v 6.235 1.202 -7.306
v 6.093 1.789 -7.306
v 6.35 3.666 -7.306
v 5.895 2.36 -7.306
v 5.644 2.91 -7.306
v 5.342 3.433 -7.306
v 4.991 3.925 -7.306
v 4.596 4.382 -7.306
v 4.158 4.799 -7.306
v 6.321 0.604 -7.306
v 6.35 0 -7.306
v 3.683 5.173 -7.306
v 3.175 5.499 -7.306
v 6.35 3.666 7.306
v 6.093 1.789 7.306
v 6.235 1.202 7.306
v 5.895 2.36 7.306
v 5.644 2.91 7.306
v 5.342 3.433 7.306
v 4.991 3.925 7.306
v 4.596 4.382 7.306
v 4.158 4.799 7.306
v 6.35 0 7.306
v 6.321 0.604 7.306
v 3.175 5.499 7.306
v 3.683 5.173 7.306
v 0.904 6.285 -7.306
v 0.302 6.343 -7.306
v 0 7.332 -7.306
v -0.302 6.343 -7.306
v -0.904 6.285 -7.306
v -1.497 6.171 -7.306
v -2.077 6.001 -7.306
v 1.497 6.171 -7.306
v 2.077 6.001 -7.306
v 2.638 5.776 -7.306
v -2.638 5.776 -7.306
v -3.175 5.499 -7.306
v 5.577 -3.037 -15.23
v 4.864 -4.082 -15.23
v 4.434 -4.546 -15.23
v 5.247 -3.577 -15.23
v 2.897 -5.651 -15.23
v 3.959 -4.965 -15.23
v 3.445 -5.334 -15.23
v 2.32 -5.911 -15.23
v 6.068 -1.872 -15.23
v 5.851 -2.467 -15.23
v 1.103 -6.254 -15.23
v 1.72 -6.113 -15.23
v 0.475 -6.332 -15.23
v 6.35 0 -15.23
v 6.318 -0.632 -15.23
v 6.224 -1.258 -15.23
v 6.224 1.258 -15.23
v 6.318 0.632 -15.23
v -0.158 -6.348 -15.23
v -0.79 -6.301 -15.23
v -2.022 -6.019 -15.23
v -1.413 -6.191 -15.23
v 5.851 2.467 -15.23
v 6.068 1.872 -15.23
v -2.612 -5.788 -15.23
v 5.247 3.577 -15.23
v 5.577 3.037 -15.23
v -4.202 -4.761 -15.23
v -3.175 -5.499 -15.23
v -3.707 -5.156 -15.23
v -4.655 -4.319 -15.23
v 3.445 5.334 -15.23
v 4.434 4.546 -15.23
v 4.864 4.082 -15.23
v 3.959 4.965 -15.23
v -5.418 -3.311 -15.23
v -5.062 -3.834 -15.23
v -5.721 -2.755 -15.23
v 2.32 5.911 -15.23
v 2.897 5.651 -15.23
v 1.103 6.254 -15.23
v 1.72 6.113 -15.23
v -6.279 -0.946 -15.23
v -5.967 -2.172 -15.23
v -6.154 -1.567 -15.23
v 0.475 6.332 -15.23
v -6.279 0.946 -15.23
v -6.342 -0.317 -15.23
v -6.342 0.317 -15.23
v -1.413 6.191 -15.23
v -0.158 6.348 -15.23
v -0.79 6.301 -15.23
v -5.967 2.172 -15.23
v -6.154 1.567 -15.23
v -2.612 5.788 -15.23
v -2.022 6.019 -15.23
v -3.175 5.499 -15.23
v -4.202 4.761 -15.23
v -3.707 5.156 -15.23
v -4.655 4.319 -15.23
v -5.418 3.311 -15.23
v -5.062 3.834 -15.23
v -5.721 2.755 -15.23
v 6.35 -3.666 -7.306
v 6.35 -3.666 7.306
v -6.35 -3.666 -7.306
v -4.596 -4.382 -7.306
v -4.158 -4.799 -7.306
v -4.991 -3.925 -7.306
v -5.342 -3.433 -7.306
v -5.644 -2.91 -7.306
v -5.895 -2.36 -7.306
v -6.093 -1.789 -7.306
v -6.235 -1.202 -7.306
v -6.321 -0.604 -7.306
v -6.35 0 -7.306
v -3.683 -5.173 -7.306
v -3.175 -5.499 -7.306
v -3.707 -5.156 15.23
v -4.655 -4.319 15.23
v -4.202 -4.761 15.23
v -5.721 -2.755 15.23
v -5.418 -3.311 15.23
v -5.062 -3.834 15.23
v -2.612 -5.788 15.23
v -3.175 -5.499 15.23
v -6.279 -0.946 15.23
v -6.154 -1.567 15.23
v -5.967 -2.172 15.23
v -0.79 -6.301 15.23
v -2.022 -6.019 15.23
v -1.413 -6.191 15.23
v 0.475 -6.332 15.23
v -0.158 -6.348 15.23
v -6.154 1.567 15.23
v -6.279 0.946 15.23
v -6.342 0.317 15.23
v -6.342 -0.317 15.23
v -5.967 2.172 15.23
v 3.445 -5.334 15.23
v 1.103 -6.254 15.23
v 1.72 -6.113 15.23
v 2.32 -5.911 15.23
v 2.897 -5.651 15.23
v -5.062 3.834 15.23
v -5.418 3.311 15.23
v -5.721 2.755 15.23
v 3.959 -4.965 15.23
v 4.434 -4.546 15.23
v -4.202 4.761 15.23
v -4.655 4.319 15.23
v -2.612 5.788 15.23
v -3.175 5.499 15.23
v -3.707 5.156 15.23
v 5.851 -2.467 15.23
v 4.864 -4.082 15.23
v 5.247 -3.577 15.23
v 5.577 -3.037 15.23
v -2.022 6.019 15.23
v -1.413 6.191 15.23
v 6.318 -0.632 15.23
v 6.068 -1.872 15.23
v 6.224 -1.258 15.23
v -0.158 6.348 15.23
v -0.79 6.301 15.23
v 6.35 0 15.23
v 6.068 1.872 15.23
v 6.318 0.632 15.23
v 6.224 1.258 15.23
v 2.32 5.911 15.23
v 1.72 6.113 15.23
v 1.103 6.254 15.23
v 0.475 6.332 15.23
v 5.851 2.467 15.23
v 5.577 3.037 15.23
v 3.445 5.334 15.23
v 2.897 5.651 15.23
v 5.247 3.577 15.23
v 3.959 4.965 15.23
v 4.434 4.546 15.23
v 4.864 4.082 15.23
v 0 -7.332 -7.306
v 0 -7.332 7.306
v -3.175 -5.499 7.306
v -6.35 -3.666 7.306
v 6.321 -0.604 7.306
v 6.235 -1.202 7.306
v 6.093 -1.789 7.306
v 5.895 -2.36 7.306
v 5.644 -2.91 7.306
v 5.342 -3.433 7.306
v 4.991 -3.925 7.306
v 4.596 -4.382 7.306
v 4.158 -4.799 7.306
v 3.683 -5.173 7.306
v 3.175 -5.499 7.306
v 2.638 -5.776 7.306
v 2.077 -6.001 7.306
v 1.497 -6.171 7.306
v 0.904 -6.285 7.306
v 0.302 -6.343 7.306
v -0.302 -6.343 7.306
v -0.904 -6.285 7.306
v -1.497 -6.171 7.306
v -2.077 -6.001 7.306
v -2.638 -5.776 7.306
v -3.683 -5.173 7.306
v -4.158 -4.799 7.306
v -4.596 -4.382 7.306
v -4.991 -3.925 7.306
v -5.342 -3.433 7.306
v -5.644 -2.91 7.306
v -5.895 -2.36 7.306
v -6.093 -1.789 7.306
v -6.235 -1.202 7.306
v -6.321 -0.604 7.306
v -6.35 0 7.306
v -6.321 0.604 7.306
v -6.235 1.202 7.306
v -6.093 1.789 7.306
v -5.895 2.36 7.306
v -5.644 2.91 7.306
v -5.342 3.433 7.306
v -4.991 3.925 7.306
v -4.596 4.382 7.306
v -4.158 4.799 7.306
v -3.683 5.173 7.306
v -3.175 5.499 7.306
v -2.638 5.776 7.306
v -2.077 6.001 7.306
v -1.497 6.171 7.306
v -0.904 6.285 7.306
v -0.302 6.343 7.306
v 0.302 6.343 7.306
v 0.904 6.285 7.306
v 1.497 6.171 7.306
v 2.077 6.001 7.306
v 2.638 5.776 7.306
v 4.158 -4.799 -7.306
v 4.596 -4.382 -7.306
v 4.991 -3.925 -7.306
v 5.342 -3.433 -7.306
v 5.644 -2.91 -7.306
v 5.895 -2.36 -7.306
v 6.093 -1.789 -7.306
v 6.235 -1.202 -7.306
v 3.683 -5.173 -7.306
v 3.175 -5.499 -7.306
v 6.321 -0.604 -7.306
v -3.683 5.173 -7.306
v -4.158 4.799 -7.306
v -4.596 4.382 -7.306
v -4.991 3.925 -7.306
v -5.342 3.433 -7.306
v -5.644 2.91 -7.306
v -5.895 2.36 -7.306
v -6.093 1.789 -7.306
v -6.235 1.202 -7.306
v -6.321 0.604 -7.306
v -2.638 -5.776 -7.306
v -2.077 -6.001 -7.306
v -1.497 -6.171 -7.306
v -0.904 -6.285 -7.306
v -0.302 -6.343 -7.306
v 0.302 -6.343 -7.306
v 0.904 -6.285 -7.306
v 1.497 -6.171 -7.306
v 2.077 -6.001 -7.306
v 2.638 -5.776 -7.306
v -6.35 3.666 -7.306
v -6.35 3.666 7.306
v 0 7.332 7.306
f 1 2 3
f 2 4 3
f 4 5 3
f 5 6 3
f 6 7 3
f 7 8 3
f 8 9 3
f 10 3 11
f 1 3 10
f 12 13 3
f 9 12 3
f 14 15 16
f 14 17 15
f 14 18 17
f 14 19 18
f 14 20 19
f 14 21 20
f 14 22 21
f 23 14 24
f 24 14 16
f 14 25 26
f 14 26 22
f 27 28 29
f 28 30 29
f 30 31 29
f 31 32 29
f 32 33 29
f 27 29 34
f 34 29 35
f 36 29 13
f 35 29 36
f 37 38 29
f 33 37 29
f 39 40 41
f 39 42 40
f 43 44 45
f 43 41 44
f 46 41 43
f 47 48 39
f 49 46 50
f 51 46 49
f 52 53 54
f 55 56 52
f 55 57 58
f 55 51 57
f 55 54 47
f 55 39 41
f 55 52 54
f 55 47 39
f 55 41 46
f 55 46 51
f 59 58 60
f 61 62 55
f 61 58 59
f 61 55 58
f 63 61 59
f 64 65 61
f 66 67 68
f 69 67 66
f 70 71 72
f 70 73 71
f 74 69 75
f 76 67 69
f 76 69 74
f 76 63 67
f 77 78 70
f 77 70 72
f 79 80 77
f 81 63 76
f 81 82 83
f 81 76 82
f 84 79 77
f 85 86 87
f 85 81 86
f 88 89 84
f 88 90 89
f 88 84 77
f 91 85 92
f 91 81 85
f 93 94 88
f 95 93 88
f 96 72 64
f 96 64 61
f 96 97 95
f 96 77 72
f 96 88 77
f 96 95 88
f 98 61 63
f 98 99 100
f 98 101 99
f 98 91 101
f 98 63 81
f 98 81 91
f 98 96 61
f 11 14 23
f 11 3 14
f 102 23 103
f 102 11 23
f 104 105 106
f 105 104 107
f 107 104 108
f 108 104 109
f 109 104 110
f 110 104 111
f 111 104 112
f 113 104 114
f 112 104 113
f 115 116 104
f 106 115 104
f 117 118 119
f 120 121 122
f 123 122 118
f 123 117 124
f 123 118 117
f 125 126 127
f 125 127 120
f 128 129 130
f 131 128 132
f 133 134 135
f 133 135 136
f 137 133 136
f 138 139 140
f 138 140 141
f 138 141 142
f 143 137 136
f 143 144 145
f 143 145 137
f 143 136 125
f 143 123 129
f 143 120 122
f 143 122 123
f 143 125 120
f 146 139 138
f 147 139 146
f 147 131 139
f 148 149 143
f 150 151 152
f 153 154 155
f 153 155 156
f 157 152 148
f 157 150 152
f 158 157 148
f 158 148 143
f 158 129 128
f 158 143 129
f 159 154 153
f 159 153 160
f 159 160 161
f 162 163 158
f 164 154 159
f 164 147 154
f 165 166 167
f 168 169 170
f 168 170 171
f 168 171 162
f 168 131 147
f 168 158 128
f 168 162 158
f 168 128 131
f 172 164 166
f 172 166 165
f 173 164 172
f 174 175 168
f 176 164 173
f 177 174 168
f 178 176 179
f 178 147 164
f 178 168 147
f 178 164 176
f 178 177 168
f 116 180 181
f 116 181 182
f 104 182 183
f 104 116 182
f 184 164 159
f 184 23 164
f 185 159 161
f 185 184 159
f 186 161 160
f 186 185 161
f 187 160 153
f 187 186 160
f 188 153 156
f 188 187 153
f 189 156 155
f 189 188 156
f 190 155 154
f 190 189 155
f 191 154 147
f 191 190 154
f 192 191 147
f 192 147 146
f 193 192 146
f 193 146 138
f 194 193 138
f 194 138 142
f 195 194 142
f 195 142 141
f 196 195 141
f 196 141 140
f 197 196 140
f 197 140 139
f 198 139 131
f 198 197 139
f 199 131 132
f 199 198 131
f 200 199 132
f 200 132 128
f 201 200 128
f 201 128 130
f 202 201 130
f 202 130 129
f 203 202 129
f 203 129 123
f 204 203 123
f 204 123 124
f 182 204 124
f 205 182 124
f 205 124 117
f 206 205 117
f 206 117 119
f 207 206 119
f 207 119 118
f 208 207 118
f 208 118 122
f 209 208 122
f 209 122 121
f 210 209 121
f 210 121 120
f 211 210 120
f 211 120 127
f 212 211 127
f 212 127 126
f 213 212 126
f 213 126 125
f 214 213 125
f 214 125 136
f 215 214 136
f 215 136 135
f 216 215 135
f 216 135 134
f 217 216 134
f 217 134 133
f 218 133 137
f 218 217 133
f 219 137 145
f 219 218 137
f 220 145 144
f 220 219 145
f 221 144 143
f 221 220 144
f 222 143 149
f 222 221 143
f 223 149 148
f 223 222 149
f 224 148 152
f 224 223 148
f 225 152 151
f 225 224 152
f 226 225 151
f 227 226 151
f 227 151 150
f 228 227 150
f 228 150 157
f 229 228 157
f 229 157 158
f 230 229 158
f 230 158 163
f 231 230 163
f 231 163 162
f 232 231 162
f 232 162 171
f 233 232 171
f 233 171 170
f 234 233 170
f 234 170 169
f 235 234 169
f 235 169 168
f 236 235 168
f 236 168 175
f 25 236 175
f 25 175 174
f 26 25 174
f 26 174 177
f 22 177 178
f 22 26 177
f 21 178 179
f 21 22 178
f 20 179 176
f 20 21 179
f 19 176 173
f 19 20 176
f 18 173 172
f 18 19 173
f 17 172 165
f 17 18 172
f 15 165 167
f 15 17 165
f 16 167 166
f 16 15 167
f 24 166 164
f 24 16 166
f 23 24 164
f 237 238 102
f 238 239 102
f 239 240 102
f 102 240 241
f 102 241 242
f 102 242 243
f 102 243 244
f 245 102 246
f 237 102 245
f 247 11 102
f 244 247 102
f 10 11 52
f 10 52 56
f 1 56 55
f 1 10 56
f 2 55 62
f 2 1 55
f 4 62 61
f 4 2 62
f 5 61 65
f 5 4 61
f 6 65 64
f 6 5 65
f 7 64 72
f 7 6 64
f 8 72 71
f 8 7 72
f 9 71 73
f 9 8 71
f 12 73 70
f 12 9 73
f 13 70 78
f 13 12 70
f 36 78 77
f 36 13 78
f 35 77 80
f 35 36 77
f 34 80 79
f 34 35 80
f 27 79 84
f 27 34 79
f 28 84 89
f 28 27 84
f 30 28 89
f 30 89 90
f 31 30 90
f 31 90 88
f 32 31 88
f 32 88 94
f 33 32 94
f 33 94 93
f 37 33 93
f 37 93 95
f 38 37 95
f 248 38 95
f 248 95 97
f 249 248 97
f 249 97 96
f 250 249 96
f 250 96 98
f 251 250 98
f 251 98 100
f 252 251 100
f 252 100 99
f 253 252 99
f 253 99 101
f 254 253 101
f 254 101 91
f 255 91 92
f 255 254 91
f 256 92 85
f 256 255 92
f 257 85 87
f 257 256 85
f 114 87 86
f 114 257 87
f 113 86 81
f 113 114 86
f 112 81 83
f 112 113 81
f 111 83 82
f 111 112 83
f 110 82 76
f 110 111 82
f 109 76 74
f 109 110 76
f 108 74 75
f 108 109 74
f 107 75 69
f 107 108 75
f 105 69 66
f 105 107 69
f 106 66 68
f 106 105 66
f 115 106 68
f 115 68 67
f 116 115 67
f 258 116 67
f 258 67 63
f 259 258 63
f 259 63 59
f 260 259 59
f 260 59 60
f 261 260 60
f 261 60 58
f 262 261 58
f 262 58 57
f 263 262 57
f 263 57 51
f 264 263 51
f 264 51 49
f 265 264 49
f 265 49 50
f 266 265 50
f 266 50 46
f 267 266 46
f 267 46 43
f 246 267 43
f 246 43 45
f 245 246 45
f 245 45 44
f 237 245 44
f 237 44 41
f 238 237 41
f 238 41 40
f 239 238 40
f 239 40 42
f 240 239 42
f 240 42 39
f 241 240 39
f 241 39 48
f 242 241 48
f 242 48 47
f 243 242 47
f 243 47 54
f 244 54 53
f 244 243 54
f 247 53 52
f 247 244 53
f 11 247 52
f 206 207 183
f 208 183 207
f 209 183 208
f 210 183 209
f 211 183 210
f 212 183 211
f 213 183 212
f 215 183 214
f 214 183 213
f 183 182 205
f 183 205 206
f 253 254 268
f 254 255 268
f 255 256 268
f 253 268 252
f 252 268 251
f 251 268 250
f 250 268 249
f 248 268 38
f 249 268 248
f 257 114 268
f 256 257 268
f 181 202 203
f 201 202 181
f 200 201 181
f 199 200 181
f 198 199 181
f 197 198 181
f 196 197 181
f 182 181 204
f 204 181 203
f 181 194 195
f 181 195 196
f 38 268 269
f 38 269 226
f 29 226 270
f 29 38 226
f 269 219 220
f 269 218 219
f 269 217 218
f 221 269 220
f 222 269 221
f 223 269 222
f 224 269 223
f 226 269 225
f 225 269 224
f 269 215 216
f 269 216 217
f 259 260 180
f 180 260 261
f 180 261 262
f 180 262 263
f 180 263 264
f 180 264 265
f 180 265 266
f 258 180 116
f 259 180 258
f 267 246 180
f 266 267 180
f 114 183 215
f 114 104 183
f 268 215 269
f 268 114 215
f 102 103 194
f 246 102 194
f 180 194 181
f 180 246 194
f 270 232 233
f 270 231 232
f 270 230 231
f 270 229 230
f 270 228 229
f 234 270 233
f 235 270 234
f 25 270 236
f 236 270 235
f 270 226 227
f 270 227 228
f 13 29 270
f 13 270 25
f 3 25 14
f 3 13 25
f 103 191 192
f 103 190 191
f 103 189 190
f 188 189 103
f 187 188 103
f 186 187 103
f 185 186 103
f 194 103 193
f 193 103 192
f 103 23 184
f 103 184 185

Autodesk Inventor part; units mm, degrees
ref_plane "YZ Plane" through (0, 0, 0) normal (1, 0, 0) x (0, 1, 0)
ref_plane "XZ Plane" through (0, 0, 0) normal (0, 1, 0) x (-1, 0, 0)
ref_plane "XY Plane" through (0, 0, 0) normal (0, 0, 1) x (1, 0, 0)
sketch "Sketch1" plane through (0, 0, 0) normal (0, 0, 1) x (1, 0, 0)
  line L0 (-6.35, -3.6662) -> (-6.35, 3.6662)
  line L1 (-6.35, 3.6662) -> (0, 7.3323)
  line L2 (0, 7.3323) -> (6.35, 3.6662)
  line L3 (6.35, 3.6662) -> (6.35, -3.6662)
  line L4 (6.35, -3.6662) -> (0, -7.3323)
  line L5 (0, -7.3323) -> (-6.35, -3.6662)
  point P0 (0, 0)
  point P1 (0, 0)
  dimension "Size" = 12.7
extrude "Extrusion1" add sketch "Sketch1" along normal mid plane 14.6114
sketch "Sketch2" plane through (0, 0, 7.3057) normal (0, 0, 1) x (1, 0, 0)
  line L0 (-6.35, 3.6662) -> (-6.35, -3.6662) construction
  line L1 (-6.35, -3.6662) -> (0, -7.3323) construction
  line L2 (0, -7.3323) -> (6.35, -3.6662) construction
  line L3 (6.35, -3.6662) -> (6.35, 3.6662) construction
  line L4 (6.35, 3.6662) -> (0, 7.3323) construction
  line L5 (0, 7.3323) -> (-6.35, 3.6662) construction
  circle A0 centre (0, 0) radius 6.35
extrude "Extrusion2" add sketch "Sketch2" along normal blind 7.9248
mirror "Mirror1" about plane through (0, 0, 0) normal (0, 0, 1) of "Extrusion2"
properties part number "EL2-CGB-011" material "Aluminum 6061"
